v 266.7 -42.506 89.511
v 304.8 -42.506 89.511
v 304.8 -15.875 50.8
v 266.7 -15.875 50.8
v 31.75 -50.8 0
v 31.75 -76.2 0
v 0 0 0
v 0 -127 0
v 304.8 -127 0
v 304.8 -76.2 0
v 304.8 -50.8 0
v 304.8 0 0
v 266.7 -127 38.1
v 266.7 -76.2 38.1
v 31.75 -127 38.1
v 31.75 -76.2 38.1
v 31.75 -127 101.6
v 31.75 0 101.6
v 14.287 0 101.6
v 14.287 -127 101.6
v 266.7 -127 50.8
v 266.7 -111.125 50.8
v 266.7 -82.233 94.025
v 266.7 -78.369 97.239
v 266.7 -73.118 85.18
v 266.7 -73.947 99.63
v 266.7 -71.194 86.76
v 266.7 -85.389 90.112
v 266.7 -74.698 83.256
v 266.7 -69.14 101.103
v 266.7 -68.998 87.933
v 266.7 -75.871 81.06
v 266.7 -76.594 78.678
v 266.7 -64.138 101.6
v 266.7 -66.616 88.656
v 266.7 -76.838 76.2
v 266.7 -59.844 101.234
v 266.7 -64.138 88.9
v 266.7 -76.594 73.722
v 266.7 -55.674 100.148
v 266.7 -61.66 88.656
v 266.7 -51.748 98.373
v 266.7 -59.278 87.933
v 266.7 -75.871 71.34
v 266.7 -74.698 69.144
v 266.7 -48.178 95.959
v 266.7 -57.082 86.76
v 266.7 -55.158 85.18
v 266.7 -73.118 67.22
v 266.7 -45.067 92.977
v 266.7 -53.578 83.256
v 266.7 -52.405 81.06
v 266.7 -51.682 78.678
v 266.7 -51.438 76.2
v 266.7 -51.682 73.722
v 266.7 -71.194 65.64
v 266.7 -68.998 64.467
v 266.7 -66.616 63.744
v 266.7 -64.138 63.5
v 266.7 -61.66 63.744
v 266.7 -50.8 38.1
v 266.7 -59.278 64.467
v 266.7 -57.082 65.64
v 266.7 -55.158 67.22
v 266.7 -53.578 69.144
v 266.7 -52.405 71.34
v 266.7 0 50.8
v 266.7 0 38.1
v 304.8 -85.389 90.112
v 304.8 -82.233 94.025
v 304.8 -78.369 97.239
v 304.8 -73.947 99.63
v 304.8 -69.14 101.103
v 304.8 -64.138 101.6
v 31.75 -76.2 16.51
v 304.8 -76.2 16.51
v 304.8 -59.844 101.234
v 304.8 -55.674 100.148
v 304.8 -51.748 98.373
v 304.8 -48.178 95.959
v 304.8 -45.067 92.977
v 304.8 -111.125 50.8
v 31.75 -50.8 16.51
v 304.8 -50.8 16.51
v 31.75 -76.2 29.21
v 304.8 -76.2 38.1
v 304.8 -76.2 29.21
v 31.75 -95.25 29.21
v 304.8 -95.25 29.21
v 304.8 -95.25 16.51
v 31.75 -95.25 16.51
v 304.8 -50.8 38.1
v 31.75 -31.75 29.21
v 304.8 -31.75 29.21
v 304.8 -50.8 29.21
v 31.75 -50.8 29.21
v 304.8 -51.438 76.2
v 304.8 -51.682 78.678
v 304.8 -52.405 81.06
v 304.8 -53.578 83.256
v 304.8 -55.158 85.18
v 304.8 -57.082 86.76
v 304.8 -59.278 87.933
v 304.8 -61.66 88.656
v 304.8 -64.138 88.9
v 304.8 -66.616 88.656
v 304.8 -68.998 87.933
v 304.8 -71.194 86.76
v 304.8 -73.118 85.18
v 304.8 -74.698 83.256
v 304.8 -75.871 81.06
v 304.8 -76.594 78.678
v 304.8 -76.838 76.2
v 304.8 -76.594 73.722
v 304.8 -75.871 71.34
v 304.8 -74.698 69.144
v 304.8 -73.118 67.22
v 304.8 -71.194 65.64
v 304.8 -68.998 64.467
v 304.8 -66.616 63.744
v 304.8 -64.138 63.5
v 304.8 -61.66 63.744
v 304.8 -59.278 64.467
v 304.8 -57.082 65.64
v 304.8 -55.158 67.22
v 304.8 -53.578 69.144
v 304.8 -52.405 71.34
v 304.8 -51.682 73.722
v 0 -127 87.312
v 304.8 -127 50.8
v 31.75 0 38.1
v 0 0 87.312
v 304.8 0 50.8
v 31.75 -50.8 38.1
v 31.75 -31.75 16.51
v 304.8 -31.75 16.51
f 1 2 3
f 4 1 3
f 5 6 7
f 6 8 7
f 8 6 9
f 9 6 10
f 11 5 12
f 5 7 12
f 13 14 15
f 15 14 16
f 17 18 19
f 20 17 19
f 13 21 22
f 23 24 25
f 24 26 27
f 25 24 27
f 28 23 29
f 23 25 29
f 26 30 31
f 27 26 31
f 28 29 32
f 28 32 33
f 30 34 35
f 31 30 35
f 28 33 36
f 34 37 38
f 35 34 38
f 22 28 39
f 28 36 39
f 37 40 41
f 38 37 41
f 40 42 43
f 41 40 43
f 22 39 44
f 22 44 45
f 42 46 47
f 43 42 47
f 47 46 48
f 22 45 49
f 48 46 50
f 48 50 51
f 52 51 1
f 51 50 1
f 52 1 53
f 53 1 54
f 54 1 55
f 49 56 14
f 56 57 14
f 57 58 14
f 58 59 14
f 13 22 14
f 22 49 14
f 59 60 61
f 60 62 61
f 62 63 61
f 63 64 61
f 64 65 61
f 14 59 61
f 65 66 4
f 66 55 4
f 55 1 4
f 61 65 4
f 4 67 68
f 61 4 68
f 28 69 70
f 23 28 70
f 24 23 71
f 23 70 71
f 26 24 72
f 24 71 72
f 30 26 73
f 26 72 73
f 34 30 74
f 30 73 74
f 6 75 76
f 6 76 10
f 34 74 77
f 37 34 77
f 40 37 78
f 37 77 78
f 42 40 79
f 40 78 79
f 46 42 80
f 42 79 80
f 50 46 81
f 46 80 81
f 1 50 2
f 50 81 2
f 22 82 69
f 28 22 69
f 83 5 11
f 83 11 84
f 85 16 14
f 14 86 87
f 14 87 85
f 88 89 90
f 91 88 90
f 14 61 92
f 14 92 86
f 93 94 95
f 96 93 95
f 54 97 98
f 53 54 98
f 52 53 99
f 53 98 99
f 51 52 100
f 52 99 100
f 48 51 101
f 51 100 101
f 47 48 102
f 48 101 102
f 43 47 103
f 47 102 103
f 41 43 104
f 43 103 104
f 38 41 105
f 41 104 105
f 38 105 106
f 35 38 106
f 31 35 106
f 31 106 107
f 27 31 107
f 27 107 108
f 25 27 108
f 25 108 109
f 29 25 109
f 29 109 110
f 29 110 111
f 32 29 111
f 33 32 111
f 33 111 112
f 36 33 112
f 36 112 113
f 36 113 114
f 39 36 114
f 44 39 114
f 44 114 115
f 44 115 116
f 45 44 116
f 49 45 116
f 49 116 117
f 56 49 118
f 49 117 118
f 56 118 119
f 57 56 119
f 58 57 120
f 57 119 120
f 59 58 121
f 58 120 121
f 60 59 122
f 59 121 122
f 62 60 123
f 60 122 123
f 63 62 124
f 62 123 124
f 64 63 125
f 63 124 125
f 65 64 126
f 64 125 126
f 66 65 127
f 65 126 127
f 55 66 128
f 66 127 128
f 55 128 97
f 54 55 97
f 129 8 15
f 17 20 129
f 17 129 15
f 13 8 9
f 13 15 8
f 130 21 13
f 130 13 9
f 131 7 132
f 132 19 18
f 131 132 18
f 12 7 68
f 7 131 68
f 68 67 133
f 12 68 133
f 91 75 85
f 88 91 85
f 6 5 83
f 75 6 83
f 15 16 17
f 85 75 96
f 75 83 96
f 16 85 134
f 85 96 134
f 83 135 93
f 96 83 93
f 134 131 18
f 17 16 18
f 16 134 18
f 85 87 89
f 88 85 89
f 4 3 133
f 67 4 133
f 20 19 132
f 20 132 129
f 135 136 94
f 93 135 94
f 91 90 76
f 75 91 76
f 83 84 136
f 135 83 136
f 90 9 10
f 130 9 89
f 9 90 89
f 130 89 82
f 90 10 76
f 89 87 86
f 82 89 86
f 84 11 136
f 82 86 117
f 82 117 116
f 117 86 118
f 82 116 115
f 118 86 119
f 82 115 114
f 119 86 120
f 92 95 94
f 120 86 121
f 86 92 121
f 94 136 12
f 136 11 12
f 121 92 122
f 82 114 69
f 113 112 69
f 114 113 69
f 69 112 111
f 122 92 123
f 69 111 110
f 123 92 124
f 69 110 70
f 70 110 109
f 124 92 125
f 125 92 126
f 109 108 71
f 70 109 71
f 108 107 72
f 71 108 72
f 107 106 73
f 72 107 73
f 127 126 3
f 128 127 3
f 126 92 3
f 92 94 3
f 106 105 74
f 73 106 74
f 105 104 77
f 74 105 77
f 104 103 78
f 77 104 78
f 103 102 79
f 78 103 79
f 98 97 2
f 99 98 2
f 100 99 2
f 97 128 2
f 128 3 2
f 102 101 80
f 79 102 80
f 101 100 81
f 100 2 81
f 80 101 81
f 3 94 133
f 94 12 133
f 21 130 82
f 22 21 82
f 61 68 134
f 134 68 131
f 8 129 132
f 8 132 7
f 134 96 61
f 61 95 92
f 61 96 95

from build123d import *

# Parameters (mm, degrees)
F1_DEPTH = 127
F2_SIZE  = 14.2875
F3_R     = 12.7
F4_DEPTH = 273.05


with BuildPart() as f1:
    # F0 (on Front) → F1 (new body)
    with BuildSketch(Plane.XZ):
        Polygon((0, 101.6), (0, 0), (304.8, 0), (304.8, 101.6), (266.7, 101.6), (266.7, 38.1), (31.75, 38.1), (31.75, 101.6), align=None)
    extrude(amount=F1_DEPTH)

    # F2
    f2_edges = [f1.edges().sort_by_distance(p)[0] for p in [
        (0, -63.5, 101.6),
    ]]
    chamfer(f2_edges, length=F2_SIZE)

    # F3 (on face) → F4 (cut)
    with BuildSketch(Plane.YZ.offset(304.8)):
        with BuildLine():
            ThreePointArc((-85.389287, 90.112113), (-76.216845, 98.544213), (-64.138096, 101.6))
            Line((-64.138096, 101.6), (-127, 101.6))
            Line((-127, 101.6), (-127, 50.8))
            Line((-127, 50.8), (-111.125, 50.8))
            Line((-111.125, 50.8), (-85.389287, 90.112113))
        make_face()
        with BuildLine():
            Line((-15.875, 50.8), (0, 50.8))
            Line((0, 50.8), (0, 101.6))
            Line((0, 101.6), (-64.138096, 101.6))
            ThreePointArc((-64.138096, 101.6), (-51.747613, 98.372865), (-42.505615, 89.51149))
            Line((-42.505615, 89.51149), (-15.875, 50.8))
        make_face()
        with Locations((-64.138096, 76.2)):
            Circle(F3_R)
        Polygon((-76.2, 16.51), (-76.2, 0), (-50.8, 0), (-50.8, 16.51), (-31.75, 16.51), (-31.75, 29.21), (-50.8, 29.21), (-50.8, 38.1), (-76.2, 38.1), (-76.2, 29.21), (-95.25, 29.21), (-95.25, 16.51), align=None)
    extrude(amount=-F4_DEPTH, mode=Mode.SUBTRACT)


solid = f1.part
